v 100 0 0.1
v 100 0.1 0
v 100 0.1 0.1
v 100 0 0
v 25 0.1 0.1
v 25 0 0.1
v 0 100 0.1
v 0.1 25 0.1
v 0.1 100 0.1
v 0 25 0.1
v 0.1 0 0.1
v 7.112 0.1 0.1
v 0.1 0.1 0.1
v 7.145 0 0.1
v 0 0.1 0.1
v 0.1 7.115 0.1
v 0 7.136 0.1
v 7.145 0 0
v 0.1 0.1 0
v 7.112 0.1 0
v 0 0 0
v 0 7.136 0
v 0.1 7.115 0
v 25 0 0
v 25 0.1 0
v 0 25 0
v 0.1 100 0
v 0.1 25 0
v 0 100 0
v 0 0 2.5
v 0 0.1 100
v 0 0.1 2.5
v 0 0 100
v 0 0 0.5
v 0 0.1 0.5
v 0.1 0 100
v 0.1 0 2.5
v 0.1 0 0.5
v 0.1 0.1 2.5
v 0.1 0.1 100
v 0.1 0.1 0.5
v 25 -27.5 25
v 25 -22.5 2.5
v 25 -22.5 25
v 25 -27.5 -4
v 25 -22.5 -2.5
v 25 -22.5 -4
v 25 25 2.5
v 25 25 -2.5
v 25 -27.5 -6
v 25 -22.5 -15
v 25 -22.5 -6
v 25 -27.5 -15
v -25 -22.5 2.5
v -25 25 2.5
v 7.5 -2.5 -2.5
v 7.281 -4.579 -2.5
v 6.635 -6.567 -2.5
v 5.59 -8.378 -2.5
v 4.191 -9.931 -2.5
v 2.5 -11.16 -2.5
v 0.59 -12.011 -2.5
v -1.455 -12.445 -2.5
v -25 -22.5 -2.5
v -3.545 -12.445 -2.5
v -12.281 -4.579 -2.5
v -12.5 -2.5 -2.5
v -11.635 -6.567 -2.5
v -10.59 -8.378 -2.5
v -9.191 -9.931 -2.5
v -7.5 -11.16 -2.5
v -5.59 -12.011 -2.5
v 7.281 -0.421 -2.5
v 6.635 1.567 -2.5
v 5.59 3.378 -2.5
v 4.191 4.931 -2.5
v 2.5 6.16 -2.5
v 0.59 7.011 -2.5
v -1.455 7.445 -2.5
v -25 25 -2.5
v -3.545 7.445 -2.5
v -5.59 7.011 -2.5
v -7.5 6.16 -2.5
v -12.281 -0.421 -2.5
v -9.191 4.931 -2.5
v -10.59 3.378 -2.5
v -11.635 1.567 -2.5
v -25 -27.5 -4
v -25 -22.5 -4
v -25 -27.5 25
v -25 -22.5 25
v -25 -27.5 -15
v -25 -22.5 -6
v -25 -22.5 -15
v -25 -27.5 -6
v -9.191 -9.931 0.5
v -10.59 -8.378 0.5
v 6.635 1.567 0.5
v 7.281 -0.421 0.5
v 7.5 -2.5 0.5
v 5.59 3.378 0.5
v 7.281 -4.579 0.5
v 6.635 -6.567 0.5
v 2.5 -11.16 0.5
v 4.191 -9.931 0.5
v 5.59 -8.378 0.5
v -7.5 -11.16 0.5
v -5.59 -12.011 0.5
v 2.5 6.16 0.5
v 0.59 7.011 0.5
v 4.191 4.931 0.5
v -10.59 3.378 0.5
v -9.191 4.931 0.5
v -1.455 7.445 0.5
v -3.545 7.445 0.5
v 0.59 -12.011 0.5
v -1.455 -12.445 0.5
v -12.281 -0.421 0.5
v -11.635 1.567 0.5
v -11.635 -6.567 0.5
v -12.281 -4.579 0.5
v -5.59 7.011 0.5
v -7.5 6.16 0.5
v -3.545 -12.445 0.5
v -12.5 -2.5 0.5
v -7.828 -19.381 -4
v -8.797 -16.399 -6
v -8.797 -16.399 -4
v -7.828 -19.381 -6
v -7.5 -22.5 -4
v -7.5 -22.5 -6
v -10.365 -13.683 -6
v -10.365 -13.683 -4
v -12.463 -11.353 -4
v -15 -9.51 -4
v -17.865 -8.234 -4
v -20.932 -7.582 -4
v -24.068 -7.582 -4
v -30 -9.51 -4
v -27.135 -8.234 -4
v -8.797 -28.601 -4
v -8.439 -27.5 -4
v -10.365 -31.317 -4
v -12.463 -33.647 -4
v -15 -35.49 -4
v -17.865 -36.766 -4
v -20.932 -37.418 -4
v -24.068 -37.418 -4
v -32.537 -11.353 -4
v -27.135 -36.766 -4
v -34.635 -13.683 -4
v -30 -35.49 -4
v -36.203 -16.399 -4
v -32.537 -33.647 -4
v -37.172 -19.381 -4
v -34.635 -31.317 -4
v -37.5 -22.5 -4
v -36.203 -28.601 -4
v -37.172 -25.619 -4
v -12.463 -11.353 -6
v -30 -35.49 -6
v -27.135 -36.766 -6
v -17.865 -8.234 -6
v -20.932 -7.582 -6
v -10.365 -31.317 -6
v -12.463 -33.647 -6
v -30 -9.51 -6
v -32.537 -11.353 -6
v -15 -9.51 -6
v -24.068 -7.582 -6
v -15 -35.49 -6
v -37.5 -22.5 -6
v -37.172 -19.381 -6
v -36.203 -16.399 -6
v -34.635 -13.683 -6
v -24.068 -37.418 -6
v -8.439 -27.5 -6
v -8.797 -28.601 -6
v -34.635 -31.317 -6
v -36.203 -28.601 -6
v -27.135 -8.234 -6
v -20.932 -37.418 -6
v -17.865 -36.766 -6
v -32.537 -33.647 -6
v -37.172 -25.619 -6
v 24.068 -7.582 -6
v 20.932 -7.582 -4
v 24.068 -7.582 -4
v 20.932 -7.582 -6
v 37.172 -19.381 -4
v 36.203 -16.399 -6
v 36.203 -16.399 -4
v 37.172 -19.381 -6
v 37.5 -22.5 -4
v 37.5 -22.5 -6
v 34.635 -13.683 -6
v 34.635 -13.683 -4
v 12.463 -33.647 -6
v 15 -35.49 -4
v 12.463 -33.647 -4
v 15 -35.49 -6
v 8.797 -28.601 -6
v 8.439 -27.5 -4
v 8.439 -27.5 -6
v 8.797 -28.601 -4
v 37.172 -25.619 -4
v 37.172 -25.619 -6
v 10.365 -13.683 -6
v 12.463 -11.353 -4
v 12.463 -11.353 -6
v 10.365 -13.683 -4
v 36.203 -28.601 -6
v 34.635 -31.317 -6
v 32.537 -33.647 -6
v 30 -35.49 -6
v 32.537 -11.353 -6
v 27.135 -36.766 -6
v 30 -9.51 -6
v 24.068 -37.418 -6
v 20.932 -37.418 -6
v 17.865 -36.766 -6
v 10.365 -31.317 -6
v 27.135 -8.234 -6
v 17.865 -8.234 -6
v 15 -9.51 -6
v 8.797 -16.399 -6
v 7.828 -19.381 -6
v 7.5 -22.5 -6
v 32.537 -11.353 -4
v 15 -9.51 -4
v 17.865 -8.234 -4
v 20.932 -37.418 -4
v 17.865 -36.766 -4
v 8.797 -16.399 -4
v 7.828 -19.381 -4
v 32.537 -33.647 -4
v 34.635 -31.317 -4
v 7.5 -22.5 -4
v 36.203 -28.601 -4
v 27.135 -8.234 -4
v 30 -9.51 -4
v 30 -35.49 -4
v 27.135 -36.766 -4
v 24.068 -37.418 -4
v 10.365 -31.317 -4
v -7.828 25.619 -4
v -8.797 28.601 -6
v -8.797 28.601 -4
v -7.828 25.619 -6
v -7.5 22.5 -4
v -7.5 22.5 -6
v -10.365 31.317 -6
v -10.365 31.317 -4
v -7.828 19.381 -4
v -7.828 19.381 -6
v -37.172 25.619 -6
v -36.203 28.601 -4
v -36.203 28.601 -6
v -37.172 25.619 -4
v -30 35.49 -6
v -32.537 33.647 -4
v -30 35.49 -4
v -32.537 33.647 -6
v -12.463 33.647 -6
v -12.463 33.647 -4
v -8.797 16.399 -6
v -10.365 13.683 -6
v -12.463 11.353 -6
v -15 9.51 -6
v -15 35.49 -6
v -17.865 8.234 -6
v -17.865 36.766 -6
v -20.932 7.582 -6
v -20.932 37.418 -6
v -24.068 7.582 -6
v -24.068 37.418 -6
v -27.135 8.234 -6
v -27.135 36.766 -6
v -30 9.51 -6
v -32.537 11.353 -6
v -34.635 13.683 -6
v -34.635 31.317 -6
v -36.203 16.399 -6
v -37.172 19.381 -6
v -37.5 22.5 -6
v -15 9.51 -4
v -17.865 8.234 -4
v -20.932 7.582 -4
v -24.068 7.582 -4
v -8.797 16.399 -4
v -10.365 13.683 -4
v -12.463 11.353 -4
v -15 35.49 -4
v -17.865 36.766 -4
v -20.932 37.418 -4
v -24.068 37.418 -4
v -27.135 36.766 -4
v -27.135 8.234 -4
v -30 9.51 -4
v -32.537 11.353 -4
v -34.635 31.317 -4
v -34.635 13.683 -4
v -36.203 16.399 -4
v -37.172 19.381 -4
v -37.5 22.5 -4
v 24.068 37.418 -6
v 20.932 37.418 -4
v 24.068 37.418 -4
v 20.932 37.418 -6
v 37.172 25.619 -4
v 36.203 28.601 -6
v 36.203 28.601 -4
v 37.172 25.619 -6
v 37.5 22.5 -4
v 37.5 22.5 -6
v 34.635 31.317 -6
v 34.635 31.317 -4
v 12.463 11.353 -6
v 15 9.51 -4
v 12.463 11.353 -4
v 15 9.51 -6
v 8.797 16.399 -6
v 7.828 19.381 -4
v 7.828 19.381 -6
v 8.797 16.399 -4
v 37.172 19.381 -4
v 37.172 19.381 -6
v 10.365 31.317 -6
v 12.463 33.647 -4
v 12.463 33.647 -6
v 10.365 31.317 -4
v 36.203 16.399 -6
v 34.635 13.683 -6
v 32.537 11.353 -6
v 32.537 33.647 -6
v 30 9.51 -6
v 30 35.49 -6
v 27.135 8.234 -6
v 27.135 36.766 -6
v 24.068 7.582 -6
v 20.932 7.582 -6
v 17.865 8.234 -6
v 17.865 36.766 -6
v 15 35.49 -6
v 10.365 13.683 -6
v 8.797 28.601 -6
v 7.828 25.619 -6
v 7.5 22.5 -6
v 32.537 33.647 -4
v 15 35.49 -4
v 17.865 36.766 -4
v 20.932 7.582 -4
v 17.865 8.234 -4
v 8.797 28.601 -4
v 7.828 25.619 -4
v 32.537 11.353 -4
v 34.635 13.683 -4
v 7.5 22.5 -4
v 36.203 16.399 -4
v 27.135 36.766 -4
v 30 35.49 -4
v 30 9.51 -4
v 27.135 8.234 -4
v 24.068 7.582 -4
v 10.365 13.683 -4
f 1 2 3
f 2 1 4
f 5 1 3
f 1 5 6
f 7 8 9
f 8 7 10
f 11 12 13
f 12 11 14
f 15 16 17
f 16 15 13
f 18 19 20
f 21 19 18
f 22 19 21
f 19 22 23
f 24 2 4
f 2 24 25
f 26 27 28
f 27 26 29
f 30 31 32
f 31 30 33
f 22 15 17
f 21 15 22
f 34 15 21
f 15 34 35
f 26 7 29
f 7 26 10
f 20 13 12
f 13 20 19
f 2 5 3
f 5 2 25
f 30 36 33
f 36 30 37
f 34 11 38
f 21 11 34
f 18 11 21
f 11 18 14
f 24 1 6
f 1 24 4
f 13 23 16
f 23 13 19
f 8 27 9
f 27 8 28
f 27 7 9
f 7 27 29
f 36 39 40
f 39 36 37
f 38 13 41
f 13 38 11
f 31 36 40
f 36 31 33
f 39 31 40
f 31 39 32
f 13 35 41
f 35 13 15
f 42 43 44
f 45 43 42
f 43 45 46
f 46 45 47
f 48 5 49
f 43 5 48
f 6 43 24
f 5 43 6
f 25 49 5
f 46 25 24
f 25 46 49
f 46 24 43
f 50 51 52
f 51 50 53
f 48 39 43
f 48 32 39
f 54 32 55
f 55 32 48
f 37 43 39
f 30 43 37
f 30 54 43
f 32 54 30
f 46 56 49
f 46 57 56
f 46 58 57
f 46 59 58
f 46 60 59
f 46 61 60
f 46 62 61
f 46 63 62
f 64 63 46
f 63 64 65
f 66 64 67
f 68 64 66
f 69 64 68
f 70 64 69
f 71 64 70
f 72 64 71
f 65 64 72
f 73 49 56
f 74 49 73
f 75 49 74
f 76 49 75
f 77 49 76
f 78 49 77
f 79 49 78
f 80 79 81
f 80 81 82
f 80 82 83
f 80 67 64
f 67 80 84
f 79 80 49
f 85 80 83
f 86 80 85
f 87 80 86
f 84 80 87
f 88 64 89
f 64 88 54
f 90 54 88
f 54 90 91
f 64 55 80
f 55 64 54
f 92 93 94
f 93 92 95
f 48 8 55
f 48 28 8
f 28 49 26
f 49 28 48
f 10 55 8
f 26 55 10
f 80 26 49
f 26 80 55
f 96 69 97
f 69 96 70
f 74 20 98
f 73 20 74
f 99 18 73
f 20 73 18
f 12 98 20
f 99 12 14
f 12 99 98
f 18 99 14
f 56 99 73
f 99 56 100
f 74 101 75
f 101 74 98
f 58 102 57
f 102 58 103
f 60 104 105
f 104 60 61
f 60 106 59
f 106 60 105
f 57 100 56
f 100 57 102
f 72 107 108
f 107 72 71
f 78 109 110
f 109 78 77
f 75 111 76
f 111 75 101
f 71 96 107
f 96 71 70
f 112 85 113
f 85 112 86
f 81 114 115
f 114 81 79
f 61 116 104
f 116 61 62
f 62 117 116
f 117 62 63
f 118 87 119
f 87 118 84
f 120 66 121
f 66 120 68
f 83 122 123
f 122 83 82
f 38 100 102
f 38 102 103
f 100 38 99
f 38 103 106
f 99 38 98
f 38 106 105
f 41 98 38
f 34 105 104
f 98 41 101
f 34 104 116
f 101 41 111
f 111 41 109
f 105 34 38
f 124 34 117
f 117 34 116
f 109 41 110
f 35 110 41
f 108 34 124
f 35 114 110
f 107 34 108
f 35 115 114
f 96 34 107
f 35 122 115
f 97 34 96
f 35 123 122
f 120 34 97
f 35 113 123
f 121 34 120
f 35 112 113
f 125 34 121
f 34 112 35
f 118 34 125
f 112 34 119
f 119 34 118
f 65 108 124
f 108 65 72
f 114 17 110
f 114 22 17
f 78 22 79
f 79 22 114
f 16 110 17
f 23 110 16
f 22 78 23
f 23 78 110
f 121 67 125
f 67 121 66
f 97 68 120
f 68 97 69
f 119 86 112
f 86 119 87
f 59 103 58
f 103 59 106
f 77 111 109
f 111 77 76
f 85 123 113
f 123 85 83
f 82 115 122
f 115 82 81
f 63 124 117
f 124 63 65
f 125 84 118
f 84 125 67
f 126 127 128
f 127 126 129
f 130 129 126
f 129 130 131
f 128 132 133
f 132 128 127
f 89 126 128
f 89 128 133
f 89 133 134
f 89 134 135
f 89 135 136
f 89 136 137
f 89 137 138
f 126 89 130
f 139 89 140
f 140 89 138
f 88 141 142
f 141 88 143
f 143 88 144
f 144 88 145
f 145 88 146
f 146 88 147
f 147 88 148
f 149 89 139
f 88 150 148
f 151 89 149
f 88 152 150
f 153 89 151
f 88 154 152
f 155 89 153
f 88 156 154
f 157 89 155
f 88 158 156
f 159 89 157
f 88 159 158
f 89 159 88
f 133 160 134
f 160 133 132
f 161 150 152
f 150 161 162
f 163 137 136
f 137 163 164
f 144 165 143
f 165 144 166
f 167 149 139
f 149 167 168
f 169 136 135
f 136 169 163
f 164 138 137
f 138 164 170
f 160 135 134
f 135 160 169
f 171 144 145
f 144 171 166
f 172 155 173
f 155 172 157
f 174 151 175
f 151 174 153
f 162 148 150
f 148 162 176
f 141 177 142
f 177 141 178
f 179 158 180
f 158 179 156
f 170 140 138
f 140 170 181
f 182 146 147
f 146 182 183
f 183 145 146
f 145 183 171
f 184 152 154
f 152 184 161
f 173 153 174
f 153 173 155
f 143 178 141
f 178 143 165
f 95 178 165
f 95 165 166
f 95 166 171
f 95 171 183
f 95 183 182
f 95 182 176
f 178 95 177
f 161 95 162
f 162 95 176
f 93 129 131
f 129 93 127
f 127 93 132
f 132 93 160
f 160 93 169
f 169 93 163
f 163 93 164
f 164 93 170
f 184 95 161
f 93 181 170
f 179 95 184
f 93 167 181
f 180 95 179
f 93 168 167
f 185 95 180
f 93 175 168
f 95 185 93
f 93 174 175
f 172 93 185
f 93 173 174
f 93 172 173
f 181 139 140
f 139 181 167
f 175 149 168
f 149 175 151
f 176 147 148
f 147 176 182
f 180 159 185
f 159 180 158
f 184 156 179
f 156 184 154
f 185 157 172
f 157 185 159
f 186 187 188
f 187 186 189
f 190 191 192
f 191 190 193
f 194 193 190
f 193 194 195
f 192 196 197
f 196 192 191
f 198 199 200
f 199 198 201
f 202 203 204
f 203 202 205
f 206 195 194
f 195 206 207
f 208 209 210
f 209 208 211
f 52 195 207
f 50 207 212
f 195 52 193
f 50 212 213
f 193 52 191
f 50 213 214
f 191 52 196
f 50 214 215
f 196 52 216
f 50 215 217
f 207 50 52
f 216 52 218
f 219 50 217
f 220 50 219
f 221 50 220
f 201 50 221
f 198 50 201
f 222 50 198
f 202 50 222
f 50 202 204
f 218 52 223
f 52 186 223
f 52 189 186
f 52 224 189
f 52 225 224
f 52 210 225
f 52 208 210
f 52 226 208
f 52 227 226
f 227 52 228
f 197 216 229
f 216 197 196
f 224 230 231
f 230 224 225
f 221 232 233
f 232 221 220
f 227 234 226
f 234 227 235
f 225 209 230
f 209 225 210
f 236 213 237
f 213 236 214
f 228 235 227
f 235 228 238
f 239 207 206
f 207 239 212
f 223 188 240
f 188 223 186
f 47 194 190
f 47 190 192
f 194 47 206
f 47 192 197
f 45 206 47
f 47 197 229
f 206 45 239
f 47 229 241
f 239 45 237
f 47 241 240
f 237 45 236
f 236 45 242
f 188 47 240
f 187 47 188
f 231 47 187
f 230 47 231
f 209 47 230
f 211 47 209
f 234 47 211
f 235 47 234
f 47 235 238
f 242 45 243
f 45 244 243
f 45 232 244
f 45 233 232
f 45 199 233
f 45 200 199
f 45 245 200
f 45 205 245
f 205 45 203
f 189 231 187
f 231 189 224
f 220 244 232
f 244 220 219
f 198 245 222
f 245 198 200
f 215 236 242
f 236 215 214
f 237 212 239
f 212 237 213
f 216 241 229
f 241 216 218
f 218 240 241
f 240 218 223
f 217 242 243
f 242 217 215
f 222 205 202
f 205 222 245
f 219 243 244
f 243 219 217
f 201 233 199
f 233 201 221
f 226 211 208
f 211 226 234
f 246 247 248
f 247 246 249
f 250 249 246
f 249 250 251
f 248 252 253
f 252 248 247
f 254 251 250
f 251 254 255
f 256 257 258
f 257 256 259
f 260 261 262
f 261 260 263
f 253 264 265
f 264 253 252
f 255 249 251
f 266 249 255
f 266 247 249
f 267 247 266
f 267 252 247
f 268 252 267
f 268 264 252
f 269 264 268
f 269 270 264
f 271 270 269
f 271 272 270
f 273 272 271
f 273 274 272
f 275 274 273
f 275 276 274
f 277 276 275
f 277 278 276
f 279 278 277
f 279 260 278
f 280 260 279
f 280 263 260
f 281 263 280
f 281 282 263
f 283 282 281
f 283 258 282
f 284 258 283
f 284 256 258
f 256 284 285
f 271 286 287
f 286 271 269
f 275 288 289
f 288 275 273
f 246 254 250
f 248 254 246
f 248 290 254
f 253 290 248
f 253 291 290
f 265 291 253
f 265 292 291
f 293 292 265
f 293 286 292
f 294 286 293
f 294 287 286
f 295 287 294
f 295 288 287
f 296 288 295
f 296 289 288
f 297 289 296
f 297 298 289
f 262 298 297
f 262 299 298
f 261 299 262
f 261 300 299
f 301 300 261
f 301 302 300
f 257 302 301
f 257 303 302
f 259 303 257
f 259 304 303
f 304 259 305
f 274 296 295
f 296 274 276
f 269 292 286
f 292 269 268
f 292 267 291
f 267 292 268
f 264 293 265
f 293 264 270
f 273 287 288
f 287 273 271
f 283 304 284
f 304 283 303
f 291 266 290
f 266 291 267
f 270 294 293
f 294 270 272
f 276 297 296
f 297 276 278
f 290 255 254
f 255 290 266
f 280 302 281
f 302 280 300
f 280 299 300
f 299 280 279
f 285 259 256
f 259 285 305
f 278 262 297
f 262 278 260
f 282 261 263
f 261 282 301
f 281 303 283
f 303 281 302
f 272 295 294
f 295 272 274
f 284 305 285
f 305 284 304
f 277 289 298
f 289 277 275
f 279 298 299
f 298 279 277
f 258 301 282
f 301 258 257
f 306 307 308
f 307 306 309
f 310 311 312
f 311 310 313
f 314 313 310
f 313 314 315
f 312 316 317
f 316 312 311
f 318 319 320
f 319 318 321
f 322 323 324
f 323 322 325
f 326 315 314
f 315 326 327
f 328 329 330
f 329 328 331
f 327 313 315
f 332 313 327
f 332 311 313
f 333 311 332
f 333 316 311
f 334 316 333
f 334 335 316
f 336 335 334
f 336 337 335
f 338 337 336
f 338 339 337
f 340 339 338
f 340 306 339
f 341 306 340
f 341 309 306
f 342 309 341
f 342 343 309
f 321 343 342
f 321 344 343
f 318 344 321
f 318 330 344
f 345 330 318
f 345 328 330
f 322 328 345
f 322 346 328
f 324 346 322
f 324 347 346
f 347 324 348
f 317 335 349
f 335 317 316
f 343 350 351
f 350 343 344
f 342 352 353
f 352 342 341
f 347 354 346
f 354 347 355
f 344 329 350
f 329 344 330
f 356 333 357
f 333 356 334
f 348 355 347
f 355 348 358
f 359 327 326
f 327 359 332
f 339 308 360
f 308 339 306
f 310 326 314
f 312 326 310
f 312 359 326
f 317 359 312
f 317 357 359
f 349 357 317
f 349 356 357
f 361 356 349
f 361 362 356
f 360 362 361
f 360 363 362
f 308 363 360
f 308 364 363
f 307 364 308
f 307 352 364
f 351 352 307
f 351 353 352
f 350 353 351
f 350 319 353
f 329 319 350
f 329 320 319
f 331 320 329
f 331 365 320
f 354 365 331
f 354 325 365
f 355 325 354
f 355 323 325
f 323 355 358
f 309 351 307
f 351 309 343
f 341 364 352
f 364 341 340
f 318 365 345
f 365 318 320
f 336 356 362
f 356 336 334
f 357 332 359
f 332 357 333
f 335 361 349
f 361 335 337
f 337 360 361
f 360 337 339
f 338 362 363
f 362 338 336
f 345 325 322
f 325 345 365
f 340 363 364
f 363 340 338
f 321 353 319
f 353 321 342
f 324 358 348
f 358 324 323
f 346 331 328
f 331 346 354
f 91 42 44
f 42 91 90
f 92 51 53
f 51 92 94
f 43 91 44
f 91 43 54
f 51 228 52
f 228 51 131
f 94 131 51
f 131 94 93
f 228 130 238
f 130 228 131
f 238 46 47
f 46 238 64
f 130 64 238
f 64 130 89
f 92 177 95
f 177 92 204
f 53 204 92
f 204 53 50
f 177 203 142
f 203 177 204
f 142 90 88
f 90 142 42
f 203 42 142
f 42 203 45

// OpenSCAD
    // Combined Scene

    // Permanent Model
    
    // Permanent Model (Black)
    color([0, 0, 0]) {
        // Your permanent model code here
        cube([100,0.1,0.1], center = false);
        cube([0.1,100,0.1], center = false);
        cube([0.1,0.1,100], center = false);
    }
    

    // Dynamic Model
    translate([0, 0, 0]) {
    // Chair Seat
    difference() {
        cube([50, 50, 5], center=true);
        translate([-2.5, -2.5, -1])
            cylinder(3, 10, 10, center=true);
        translate([-22.5, -22.5, -5])
            cylinder(2, 10, 10, center=true);
        translate([22.5, -22.5, -5])
            cylinder(2, 10, 10, center=true);
        translate([-22.5, 22.5, -5])
            cylinder(2, 10, 10, center=true);
        translate([22.5, 22.5, -5])
            cylinder(2, 10, 10, center=true);
    }
    
    // Chair Legs
    translate([-22.5, -22.5, -5]) cylinder(2, 15, 15, center=true);
    translate([22.5, -22.5, -5]) cylinder(2, 15, 15, center=true);
    translate([-22.5, 22.5, -5]) cylinder(2, 15, 15, center=true);
    translate([22.5, 22.5, -5]) cylinder(2, 15, 15, center=true);
    
    // Chair Back
    translate([0, -25, 5]) {
        cube([50, 5, 40], center=true);
    }
}
    
